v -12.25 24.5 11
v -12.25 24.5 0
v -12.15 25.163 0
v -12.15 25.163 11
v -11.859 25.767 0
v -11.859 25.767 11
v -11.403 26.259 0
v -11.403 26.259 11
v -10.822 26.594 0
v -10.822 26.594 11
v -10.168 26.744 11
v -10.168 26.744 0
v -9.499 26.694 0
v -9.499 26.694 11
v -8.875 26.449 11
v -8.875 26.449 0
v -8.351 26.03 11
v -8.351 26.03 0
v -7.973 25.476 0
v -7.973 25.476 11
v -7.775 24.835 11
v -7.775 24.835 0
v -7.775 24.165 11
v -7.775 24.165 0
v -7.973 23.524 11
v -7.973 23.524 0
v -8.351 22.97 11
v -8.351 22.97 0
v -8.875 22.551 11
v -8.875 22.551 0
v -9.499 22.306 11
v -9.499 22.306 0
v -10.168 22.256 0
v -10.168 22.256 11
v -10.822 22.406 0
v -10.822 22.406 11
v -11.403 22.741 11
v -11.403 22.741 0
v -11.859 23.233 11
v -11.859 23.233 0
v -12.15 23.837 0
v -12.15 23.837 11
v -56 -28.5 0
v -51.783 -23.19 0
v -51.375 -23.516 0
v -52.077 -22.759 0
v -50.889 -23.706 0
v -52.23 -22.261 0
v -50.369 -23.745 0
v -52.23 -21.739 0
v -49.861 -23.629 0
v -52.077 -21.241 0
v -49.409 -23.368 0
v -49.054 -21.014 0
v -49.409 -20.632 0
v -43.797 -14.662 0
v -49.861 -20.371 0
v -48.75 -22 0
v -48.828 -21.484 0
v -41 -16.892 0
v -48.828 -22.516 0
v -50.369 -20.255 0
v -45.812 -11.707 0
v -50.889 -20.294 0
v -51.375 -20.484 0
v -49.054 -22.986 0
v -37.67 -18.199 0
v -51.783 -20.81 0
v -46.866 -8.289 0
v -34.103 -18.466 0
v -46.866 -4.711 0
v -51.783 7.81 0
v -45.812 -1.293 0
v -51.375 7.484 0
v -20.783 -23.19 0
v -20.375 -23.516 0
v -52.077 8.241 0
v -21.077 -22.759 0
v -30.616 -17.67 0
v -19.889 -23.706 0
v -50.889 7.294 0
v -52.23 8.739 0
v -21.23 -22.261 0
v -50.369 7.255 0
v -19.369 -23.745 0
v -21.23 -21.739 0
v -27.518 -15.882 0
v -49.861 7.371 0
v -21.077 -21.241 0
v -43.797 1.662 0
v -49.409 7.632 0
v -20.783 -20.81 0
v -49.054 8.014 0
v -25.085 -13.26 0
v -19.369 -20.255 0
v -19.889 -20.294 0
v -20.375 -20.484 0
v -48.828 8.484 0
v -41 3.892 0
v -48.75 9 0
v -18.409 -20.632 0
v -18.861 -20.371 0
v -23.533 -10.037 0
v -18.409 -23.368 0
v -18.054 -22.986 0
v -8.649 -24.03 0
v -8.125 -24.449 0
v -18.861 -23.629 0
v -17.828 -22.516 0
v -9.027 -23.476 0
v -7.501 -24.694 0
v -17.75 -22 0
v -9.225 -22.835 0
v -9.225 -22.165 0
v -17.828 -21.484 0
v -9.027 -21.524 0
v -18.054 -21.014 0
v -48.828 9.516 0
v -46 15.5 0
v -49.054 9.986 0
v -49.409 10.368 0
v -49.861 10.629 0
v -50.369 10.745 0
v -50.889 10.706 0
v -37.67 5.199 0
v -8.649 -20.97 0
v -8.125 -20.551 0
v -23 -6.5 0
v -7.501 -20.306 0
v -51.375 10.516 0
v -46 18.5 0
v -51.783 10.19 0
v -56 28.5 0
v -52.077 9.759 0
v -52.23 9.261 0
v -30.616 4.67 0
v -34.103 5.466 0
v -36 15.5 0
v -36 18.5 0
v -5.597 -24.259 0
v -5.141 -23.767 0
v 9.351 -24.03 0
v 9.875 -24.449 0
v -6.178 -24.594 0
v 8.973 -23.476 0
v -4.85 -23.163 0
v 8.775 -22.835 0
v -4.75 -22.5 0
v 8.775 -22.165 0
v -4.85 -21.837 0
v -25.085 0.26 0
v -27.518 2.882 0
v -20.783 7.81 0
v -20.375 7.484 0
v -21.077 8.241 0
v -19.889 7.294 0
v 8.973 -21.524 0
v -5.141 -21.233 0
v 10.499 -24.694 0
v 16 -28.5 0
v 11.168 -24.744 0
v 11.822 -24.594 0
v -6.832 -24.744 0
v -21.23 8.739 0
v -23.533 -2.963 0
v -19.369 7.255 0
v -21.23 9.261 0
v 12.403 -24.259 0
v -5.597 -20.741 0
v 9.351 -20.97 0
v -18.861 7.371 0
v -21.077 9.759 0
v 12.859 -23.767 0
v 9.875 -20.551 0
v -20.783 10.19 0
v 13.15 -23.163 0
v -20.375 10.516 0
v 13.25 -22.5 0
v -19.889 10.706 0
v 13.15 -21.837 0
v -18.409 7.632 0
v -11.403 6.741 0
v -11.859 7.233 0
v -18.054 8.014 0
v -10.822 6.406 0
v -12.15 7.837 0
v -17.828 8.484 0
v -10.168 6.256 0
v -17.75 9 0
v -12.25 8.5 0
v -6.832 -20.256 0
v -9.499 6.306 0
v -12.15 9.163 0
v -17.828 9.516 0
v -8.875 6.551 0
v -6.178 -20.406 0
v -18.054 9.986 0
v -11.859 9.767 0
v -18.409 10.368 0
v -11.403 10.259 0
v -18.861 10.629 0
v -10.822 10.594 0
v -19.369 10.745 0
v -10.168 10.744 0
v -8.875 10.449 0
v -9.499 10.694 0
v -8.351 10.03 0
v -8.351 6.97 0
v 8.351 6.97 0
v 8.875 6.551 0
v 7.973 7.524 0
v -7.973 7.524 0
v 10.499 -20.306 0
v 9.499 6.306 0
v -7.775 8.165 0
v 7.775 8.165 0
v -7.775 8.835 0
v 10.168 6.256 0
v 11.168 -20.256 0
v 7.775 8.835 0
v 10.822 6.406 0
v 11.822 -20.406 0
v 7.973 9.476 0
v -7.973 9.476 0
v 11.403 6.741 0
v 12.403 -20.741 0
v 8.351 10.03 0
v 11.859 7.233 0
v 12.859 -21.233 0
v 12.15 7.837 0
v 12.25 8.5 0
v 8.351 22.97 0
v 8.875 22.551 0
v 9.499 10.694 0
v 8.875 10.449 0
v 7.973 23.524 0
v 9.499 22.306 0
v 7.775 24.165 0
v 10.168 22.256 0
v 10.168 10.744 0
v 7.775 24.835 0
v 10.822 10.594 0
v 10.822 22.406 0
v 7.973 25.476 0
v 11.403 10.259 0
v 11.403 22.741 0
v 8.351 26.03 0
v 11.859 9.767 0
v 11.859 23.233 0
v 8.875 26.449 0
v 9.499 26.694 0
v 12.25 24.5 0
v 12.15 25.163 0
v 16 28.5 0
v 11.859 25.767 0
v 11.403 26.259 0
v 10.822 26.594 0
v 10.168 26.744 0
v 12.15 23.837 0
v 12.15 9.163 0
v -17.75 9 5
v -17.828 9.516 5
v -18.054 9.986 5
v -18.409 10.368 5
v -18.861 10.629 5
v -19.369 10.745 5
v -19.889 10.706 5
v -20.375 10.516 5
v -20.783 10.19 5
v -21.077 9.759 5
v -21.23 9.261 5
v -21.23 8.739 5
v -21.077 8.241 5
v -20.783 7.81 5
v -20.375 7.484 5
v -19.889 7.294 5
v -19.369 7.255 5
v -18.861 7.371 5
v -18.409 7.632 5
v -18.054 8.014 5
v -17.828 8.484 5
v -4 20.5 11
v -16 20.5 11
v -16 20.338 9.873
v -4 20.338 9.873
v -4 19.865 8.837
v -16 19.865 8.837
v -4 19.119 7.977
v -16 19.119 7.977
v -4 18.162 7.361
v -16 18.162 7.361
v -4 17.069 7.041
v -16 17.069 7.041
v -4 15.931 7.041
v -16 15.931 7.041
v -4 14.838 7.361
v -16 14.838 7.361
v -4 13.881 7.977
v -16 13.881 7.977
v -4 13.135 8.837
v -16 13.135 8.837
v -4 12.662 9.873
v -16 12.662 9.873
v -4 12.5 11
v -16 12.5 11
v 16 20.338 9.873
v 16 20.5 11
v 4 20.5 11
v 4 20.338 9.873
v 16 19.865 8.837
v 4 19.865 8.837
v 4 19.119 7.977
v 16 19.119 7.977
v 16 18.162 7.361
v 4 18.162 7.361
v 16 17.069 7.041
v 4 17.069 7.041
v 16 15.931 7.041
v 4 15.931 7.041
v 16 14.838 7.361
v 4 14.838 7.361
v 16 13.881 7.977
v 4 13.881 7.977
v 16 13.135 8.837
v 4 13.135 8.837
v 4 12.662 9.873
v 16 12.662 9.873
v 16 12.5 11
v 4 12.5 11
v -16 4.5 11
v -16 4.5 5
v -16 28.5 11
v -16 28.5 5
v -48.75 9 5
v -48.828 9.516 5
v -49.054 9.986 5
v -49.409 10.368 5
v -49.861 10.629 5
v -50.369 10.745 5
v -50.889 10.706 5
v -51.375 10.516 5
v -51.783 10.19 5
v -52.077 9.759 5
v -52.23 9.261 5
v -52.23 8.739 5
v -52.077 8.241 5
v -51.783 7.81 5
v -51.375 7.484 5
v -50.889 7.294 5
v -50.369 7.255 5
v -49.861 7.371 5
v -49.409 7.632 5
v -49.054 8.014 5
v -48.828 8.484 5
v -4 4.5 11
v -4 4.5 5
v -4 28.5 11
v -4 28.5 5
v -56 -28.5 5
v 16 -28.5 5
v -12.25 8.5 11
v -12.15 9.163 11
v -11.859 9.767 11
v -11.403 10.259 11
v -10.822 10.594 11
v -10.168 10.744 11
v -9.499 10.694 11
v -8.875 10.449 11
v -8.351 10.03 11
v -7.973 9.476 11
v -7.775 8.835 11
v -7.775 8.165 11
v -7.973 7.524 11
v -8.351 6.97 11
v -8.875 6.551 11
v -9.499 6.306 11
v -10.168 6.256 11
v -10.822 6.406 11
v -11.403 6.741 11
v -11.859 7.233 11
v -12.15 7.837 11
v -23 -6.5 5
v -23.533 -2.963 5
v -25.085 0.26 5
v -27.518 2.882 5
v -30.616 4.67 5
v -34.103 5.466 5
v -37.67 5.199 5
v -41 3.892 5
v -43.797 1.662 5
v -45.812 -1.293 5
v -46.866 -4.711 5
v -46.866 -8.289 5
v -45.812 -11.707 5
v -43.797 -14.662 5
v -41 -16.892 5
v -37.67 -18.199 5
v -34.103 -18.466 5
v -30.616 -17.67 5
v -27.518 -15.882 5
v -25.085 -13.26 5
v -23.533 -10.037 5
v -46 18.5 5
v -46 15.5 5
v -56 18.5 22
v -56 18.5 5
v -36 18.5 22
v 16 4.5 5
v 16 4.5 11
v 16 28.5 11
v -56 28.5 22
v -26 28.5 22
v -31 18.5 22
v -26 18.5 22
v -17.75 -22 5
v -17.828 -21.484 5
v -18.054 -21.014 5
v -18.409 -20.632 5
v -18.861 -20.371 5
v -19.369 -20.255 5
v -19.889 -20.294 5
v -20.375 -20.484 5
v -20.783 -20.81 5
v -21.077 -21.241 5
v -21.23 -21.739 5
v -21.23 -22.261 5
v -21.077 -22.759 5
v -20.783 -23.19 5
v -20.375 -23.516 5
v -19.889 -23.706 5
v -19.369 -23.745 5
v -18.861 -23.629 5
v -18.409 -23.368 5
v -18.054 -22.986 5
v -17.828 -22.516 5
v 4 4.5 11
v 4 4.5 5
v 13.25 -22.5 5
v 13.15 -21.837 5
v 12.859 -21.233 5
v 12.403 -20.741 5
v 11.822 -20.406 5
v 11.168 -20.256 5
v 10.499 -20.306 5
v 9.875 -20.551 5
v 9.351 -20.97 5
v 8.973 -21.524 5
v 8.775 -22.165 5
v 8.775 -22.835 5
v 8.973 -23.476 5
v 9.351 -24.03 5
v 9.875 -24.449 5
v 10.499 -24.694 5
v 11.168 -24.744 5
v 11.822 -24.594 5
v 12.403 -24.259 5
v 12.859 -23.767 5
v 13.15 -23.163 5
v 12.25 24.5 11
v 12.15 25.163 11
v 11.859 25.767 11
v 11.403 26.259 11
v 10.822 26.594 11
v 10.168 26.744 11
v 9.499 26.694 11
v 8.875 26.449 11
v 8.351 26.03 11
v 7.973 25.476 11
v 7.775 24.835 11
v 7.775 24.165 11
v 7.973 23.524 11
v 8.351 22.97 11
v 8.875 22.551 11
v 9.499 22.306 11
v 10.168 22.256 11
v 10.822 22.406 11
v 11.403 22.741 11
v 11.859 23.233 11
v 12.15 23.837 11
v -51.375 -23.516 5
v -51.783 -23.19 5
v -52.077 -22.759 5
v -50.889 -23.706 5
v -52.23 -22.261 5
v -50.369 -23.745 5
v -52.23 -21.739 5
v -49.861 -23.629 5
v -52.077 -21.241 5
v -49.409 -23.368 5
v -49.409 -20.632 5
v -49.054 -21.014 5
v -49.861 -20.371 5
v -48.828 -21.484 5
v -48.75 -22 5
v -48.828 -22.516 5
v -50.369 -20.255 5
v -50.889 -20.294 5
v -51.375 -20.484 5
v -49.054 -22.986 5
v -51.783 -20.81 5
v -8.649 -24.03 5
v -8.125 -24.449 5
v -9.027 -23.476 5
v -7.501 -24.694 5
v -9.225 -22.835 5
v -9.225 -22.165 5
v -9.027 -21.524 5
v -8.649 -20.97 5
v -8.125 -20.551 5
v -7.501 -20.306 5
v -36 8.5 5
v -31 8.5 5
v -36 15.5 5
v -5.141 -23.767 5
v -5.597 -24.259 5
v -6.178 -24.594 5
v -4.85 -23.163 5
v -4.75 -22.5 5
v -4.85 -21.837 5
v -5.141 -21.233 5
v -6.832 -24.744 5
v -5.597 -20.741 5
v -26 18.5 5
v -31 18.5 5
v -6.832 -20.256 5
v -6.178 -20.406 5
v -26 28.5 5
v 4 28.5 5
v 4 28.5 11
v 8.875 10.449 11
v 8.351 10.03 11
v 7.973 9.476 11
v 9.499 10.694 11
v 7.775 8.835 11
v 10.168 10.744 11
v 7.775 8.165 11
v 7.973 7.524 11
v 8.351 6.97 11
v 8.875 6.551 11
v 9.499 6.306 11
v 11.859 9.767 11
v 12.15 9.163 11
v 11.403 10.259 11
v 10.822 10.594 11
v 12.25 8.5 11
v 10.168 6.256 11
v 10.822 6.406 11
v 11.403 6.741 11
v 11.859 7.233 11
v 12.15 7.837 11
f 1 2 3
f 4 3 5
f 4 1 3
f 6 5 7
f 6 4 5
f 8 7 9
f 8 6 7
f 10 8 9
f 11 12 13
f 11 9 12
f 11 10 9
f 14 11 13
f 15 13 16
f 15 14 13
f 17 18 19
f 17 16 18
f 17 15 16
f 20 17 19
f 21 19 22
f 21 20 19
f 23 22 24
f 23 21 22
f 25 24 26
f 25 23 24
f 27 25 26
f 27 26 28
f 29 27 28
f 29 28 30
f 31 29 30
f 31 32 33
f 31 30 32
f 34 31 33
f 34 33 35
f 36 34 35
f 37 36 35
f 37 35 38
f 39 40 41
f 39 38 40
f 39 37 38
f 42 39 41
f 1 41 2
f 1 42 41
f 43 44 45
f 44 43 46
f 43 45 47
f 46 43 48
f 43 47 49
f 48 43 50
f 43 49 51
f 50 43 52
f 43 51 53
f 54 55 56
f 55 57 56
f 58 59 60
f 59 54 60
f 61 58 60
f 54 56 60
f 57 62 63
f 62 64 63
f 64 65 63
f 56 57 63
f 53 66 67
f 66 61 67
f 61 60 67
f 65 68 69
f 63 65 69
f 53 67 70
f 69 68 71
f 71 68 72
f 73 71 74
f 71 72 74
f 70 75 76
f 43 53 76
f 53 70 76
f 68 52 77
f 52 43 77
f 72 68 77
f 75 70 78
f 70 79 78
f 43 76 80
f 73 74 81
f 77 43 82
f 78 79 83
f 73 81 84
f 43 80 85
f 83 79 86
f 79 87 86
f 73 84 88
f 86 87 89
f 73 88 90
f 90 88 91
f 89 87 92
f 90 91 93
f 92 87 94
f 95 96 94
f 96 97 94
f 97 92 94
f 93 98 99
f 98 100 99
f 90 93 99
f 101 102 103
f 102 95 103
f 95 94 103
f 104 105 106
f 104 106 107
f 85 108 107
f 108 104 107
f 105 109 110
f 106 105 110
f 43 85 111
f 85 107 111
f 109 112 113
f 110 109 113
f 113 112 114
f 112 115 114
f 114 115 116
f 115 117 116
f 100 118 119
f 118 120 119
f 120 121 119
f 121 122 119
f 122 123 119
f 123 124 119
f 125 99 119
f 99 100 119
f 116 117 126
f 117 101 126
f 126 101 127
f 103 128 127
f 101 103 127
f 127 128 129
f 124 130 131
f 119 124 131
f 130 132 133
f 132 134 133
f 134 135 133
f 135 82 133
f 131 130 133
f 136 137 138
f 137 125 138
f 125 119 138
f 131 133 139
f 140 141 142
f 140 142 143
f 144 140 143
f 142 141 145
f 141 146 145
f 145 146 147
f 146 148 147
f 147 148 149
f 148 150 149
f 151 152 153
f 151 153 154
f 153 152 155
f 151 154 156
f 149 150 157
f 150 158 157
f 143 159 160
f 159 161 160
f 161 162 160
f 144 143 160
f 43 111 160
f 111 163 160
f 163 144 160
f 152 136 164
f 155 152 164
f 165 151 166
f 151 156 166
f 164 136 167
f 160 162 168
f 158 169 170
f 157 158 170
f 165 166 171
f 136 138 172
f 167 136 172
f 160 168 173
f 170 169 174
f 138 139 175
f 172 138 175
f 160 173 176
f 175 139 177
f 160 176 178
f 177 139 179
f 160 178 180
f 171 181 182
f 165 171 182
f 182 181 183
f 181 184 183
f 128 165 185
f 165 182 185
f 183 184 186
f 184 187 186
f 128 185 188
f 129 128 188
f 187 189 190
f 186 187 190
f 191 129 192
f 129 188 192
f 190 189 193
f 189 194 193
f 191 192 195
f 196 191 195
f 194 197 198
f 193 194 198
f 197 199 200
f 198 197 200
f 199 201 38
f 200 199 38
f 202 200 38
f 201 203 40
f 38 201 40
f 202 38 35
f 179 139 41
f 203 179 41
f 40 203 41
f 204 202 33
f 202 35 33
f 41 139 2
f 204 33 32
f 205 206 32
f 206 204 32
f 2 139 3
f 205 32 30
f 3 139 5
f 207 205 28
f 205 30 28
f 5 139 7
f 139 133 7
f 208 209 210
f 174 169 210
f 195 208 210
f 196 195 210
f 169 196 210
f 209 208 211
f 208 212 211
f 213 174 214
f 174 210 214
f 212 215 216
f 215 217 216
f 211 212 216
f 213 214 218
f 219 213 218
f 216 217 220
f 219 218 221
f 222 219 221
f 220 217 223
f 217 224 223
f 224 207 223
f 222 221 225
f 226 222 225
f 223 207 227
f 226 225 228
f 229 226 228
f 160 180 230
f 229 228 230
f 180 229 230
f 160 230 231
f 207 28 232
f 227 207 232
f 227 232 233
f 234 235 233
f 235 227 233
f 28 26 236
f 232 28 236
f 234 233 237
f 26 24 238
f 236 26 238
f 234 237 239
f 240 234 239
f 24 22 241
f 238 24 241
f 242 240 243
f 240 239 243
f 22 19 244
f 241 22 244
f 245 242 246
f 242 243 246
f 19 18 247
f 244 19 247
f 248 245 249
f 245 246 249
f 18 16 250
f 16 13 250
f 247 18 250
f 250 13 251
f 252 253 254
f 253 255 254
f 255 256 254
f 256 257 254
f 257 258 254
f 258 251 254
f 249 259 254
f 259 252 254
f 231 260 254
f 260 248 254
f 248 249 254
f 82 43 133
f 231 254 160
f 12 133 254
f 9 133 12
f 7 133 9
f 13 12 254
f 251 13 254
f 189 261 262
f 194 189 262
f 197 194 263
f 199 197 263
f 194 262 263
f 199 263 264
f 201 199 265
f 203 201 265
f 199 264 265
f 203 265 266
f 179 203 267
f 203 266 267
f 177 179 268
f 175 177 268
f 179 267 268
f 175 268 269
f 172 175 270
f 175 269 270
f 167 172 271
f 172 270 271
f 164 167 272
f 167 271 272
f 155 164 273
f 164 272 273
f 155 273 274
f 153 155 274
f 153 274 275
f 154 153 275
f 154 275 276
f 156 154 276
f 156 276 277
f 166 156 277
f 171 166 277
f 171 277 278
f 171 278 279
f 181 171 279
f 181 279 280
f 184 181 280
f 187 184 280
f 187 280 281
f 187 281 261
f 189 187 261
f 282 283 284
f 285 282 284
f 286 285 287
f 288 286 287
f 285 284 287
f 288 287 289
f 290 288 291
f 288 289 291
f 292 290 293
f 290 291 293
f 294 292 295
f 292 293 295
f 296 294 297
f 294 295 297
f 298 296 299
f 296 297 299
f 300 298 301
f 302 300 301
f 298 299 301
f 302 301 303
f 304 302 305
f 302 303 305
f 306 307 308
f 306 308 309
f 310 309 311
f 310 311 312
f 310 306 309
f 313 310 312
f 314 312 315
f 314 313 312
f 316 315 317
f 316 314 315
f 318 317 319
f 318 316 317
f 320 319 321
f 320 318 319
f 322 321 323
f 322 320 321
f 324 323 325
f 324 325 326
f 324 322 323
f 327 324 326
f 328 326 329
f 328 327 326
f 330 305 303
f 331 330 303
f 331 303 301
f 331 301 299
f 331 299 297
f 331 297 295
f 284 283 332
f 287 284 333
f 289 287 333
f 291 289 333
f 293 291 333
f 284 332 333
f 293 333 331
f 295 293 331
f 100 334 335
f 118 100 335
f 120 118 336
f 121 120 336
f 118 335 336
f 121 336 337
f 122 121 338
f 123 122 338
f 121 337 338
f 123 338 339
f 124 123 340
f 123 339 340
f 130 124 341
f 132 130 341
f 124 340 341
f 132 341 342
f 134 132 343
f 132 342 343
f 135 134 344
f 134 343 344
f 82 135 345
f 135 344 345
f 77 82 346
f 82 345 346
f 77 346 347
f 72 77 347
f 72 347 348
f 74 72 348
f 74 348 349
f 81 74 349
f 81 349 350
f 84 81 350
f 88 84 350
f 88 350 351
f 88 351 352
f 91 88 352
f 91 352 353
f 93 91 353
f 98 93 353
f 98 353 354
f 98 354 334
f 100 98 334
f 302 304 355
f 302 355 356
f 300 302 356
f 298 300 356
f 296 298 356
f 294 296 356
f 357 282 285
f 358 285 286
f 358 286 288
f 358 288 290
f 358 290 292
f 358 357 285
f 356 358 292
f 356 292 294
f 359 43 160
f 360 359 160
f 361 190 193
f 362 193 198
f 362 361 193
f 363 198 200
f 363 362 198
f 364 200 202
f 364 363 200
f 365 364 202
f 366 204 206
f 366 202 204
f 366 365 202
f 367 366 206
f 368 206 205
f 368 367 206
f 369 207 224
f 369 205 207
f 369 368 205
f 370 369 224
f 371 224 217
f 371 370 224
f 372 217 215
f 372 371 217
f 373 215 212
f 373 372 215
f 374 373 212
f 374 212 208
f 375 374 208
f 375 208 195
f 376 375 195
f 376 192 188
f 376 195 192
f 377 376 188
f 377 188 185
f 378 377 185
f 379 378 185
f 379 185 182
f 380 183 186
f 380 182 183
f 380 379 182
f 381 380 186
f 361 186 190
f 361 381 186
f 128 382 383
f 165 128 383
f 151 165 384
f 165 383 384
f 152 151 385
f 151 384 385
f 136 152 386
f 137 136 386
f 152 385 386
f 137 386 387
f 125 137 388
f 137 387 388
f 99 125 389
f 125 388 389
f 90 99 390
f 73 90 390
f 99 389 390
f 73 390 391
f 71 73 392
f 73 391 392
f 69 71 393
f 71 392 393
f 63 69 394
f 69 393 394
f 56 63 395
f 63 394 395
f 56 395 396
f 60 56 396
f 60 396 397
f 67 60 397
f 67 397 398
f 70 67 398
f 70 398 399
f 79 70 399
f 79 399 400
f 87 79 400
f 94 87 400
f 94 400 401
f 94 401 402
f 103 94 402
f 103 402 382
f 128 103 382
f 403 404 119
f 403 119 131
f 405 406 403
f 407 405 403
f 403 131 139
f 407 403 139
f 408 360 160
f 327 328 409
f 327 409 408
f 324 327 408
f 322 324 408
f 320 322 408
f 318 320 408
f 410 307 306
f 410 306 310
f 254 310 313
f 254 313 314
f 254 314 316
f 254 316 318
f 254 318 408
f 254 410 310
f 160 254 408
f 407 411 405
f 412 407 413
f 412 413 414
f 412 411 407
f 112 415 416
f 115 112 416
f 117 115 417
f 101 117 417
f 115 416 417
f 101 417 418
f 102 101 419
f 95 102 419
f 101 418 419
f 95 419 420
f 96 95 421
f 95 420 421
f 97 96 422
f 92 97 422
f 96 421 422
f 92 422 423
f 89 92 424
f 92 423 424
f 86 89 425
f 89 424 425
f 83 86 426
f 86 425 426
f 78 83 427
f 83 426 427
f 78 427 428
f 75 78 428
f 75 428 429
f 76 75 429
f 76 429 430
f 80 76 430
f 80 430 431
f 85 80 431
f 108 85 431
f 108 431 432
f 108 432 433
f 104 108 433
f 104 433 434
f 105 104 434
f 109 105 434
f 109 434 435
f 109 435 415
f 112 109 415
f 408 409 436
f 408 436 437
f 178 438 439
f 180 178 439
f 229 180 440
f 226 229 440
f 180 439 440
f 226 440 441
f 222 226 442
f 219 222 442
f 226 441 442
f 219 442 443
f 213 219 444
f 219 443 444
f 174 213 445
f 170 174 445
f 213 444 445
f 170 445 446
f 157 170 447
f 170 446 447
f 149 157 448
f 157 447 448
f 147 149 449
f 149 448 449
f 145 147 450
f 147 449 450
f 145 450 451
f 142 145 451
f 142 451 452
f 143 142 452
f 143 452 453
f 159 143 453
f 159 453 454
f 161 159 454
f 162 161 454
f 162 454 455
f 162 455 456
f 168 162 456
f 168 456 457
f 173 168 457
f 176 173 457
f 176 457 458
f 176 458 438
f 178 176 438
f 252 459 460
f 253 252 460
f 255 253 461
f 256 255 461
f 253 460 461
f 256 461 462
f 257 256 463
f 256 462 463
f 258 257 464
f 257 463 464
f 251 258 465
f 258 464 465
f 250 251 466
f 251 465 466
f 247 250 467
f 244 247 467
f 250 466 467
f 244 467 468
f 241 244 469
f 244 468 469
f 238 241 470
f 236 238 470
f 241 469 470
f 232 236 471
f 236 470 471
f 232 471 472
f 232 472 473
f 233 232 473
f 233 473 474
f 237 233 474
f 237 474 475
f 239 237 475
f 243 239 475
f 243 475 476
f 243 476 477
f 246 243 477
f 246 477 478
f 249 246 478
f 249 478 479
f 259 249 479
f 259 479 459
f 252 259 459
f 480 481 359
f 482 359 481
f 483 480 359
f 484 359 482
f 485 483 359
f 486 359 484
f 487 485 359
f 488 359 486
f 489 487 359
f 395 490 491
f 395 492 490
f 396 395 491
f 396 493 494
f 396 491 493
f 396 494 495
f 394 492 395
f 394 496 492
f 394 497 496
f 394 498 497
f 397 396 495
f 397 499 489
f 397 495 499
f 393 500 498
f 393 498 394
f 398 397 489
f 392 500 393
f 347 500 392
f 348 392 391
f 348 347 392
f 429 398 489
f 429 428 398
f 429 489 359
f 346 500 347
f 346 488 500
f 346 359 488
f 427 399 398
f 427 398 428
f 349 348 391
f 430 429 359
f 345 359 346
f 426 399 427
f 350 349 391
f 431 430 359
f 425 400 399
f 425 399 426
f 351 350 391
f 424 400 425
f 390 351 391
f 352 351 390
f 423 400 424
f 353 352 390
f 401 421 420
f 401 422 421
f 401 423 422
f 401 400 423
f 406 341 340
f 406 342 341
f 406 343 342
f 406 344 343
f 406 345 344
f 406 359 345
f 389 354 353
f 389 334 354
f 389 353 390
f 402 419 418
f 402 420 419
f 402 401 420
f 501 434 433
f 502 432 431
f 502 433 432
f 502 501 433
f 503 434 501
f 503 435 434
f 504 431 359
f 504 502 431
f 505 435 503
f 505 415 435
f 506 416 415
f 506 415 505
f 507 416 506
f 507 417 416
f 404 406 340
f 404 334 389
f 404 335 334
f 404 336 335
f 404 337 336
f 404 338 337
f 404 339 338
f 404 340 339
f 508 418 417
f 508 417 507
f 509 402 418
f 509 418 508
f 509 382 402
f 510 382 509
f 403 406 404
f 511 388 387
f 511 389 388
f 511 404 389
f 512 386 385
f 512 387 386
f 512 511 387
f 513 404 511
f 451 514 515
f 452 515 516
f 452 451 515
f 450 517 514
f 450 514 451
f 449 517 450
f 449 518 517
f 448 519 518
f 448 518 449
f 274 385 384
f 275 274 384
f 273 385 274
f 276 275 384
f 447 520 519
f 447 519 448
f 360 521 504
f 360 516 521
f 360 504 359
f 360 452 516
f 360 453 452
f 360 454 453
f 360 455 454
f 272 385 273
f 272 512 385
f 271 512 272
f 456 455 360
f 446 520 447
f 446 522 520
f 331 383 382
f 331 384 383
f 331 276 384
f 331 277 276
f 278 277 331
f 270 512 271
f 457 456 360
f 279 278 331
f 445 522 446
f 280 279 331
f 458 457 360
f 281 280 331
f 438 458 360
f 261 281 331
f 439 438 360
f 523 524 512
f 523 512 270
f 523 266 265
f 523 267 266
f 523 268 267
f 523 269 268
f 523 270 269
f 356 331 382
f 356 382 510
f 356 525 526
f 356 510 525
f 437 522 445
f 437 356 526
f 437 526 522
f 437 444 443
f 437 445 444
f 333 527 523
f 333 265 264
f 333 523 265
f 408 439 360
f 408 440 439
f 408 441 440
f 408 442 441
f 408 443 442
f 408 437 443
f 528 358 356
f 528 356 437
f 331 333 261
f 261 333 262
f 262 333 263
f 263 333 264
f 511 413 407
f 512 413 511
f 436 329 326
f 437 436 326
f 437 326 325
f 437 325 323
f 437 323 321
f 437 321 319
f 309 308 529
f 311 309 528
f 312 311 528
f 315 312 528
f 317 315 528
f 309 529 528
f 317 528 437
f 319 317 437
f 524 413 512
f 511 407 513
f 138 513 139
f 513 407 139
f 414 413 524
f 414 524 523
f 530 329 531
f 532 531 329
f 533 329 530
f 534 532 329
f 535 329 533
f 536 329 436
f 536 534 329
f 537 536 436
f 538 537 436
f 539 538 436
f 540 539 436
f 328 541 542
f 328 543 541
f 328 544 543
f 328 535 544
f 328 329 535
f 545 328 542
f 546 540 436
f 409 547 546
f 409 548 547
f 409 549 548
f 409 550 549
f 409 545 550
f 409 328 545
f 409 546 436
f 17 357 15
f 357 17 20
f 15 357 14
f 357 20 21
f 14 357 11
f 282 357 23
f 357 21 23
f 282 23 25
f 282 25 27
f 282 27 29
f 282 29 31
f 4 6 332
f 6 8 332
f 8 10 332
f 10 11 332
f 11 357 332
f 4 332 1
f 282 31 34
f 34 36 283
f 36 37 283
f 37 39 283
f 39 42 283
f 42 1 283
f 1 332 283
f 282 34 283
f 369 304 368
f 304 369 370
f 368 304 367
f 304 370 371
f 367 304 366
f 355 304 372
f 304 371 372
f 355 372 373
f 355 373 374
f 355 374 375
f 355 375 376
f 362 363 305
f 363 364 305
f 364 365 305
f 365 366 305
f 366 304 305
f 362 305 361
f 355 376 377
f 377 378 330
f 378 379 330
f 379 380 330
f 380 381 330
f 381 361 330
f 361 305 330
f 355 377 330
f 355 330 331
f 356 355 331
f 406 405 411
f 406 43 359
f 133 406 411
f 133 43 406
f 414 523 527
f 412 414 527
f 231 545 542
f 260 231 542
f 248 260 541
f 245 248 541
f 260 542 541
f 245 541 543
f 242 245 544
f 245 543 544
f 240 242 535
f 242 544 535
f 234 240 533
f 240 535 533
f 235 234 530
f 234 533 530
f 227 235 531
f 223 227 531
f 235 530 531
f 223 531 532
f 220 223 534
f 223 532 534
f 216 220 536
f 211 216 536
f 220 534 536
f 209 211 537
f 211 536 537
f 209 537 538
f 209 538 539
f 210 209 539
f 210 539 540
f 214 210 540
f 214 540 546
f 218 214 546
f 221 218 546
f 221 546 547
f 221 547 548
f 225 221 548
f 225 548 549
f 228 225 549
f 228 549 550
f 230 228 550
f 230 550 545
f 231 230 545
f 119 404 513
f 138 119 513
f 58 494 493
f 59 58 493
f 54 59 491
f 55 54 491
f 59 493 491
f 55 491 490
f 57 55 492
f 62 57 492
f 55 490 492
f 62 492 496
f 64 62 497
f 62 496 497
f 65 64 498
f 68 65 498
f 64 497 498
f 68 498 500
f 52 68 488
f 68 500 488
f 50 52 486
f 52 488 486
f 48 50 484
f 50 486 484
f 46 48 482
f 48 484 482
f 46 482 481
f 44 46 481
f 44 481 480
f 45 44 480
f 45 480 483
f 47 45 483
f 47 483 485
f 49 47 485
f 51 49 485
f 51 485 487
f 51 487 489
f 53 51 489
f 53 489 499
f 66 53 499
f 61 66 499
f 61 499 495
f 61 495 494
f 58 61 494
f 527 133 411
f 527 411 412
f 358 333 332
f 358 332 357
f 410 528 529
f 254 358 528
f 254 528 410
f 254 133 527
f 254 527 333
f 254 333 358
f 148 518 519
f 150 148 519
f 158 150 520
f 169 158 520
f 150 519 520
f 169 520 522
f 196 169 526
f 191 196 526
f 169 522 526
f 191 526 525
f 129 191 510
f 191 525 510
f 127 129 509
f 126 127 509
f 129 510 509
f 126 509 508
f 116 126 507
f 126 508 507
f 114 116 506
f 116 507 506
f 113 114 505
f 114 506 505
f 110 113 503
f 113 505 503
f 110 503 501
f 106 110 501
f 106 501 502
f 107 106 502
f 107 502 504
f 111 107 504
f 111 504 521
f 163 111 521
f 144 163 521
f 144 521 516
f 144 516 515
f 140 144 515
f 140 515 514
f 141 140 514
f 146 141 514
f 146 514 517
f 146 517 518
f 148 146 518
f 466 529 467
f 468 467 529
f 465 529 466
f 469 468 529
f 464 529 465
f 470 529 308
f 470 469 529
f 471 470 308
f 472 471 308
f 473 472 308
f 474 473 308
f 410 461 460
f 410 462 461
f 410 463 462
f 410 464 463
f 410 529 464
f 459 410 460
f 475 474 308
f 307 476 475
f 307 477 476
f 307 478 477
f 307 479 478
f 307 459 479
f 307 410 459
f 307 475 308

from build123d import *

# Parameters (mm, degrees)
SKETCH1_W           = 72
SKETCH1_H           = 57
BOSS_EXTRUDE1_DEPTH = 5
BOSS_EXTRUDE2_DEPTH = 12
SKETCH5_R           = 2.25
CUT_EXTRUDE2_DEPTH  = 64.790673299
SKETCH4_R           = 12
SKETCH4_R_2         = 1.75
CUT_EXTRUDE1_DEPTH  = 64.120915709
SKETCH6_R           = 2.25
CUT_EXTRUDE3_DEPTH  = 64.120915709
SKETCH7_W           = 30
SKETCH7_H           = 10
BOSS_EXTRUDE3_DEPTH = 17
BOSS_EXTRUDE4_START = -5
BOSS_EXTRUDE4_DEPTH = 5
SKETCH9_W           = 10
SKETCH9_H           = 3
CUT_EXTRUDE4_DEPTH  = 66.094162565


with BuildPart() as part:
    # Sketch1 → Boss-Extrude1 (new body)
    with BuildSketch(Plane.XY):
        with Locations((-20, 0)):
            Rectangle(SKETCH1_W, SKETCH1_H)
    extrude(amount=BOSS_EXTRUDE1_DEPTH)

    # Sketch3 → Boss-Extrude2 (add)
    with BuildSketch(Plane(origin=(16, 0, 0), x_dir=(0, 0, -1), z_dir=(1, 0, 0))):
        with BuildLine():
            Line((-5, 28.5), (-11, 28.5))
            Line((-11, 28.5), (-11, 20.5))
            ThreePointArc((-11, 20.5), (-7, 16.5), (-11, 12.5))
            Line((-11, 12.5), (-11, 4.5))
            Line((-11, 4.5), (-5, 4.5))
            Line((-5, 4.5), (-5, 28.5))
        make_face()
    boss_extrude2 = extrude(amount=-BOSS_EXTRUDE2_DEPTH)

    # Sketch5 → Cut-Extrude2 (cut, through all)
    with BuildSketch(Plane.XY.offset(11)):
        with Locations((10, 24.5)):
            Circle(SKETCH5_R)
        with Locations((10, 8.5)):
            Circle(SKETCH5_R)
    cut_extrude2 = extrude(amount=-CUT_EXTRUDE2_DEPTH, mode=Mode.SUBTRACT)

    # Mirror1: Boss-Extrude2, Cut-Extrude2 across plane
    add(boss_extrude2.mirror(Plane(origin=(0, 0, 0), x_dir=(0, 0, 1), z_dir=(1, 0, 0))))
    add(cut_extrude2.mirror(Plane(origin=(0, 0, 0), x_dir=(0, 0, 1), z_dir=(1, 0, 0))), mode=Mode.SUBTRACT)

    # Sketch4 → Cut-Extrude1 (cut, through all)
    with BuildSketch(Plane.XY.offset(5)):
        with Locations((-35, -6.5)):
            Circle(SKETCH4_R)
        with Locations((-50.5, 9)):
            Circle(SKETCH4_R_2)
        with Locations((-19.5, 9)):
            Circle(SKETCH4_R_2)
        with Locations((-19.5, -22)):
            Circle(SKETCH4_R_2)
        with Locations((-50.5, -22)):
            Circle(SKETCH4_R_2)
    extrude(amount=-CUT_EXTRUDE1_DEPTH, mode=Mode.SUBTRACT)

    # Sketch6 → Cut-Extrude3 (cut, through all)
    with BuildSketch(Plane.XY.offset(5)):
        with Locations((-7, -22.5)):
            Circle(SKETCH6_R)
        with Locations((11, -22.5)):
            Circle(SKETCH6_R)
    extrude(amount=-CUT_EXTRUDE3_DEPTH, mode=Mode.SUBTRACT)

    # Sketch7 → Boss-Extrude3 (add)
    with BuildSketch(Plane.XY.offset(5)):
        with Locations((-41, 23.5)):
            Rectangle(SKETCH7_W, SKETCH7_H)
    extrude(amount=BOSS_EXTRUDE3_DEPTH)

    # Sketch8 → Boss-Extrude4 (add)
    with BuildSketch(Plane(origin=(-26, 0, 0), x_dir=(0, 0, -1), z_dir=(1, 0, 0)).offset(BOSS_EXTRUDE4_START)):
        Polygon((-22, 18.5), (-5, 8.5), (-5, 18.5), align=None)
    extrude(amount=-BOSS_EXTRUDE4_DEPTH)

    # Sketch9 → Cut-Extrude4 (cut, through all)
    with BuildSketch(Plane.XY.offset(5)):
        with Locations((-41, 17)):
            Rectangle(SKETCH9_W, SKETCH9_H)
    extrude(amount=-CUT_EXTRUDE4_DEPTH, mode=Mode.SUBTRACT)


solid = part.part
